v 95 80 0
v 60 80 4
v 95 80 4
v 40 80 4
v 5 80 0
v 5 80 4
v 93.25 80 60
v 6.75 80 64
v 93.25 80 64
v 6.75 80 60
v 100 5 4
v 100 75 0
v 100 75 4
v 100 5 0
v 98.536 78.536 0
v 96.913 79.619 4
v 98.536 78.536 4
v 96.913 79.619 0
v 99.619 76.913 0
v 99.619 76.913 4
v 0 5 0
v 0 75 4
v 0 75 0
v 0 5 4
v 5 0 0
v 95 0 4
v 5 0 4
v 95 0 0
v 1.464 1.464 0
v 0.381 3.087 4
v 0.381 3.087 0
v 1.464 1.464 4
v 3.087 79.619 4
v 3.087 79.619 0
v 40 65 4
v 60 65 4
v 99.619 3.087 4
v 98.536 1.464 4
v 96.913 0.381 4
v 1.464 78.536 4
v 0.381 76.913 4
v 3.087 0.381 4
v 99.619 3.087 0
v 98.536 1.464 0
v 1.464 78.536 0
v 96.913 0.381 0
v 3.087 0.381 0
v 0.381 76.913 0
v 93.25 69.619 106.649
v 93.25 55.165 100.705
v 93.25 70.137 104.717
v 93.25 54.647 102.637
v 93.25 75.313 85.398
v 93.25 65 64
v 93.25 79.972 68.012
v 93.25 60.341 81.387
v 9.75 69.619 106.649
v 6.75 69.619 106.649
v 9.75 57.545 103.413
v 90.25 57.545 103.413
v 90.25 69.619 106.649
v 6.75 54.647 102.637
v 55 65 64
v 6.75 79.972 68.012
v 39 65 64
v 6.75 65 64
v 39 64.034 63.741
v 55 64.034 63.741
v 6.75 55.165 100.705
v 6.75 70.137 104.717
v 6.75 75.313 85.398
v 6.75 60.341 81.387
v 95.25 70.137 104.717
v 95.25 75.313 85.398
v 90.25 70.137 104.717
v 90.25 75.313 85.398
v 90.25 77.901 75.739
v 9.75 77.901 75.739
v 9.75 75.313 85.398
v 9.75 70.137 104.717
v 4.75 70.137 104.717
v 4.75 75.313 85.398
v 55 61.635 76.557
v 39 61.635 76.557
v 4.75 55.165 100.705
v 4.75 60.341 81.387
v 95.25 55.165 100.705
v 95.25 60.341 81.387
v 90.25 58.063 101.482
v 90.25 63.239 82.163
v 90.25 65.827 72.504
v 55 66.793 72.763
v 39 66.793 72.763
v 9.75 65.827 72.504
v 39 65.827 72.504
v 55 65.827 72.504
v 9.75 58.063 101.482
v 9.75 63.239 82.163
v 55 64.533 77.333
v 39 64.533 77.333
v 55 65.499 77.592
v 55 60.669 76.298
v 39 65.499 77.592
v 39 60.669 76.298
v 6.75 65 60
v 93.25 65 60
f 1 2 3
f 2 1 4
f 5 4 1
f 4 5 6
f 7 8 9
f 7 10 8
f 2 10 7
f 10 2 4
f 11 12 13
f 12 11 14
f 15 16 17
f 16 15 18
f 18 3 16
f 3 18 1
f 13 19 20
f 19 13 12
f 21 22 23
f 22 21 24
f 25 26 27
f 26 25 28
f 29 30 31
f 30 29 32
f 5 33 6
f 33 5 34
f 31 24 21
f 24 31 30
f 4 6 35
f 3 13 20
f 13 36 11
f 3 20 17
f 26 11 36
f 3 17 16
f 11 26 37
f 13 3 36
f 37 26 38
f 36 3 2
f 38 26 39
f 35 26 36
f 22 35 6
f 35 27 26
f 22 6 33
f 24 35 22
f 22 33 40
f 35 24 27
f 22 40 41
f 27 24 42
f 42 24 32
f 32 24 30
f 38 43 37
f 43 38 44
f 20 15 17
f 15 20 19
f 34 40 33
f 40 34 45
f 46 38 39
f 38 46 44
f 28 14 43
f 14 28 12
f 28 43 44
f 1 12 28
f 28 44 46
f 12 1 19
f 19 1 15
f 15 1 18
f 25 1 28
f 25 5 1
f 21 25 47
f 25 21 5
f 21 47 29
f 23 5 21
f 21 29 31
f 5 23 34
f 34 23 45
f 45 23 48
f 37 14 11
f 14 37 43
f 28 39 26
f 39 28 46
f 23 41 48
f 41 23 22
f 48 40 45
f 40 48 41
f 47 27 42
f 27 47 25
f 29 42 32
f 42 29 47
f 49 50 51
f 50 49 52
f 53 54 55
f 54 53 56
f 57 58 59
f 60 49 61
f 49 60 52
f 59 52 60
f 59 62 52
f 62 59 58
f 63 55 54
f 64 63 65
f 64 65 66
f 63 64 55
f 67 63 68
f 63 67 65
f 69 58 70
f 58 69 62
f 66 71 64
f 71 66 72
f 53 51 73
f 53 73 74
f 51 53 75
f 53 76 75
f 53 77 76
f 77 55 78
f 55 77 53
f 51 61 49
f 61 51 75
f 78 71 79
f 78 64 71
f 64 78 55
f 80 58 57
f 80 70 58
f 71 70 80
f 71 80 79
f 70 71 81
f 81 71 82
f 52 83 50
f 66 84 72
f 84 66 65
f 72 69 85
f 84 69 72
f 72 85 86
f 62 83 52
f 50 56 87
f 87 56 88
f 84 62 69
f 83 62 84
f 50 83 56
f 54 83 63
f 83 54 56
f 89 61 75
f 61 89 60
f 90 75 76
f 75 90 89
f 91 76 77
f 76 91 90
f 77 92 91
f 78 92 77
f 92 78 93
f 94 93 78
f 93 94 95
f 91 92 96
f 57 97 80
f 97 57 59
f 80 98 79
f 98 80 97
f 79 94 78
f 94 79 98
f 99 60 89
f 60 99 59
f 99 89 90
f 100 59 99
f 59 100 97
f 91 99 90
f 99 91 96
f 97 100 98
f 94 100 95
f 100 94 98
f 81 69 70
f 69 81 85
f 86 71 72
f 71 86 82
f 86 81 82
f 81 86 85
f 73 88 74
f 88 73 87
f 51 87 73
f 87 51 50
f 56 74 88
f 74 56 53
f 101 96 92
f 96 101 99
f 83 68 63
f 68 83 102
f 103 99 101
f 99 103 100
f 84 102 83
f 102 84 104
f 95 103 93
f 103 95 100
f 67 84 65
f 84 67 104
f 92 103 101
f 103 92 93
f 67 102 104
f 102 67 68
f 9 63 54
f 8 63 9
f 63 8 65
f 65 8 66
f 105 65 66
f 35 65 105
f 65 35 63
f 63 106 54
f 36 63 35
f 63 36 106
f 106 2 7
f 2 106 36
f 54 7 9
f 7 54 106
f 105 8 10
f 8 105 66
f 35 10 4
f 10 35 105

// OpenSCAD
// ============================================================================
// Professional Phone Mount - Car Dashboard/Desk Mount
// Purpose: Adjustable phone holder with secure grip and tilt mechanism
// Units: millimetres (mm)
// ============================================================================

/* ----------------------------- USER PARAMETERS -------------------------------- */
phone_width = 80;         // phone width (mm) - iPhone 14: 71.5mm, Samsung S23: 70.9mm
phone_thickness = 12;     // phone thickness with case (mm)
mount_base_width = 100;   // base plate width for stability (mm)
mount_base_depth = 80;    // base plate depth (mm) 
arm_height = 60;          // height of mounting arm (mm)
tilt_angle = 15;          // viewing angle tilt (degrees)
grip_depth = 15;          // how deep the side grips go (mm)
bottom_support_height = 8; // height of bottom phone rest (mm)

/* ------------------------- Assertions & Limits ---------------------------- */
assert(phone_width >= 60 && phone_width <= 100, "Phone width should be 60-100mm");
assert(phone_thickness >= 8 && phone_thickness <= 20, "Phone thickness should be 8-20mm");
assert(tilt_angle >= 0 && tilt_angle <= 45, "Tilt angle should be 0-45 degrees");

/* ------------------------- Derived Measurements --------------------------- */
wall_thickness = 3;
tolerance = 0.5;
phone_cradle_width = phone_width + tolerance;
phone_cradle_depth = phone_thickness + tolerance;

/* ------------------------------ Modules ---------------------------------- */

module base_plate() {
    // Stable base with rounded corners
    hull() {
        translate([5, 5, 0]) cylinder(r=5, h=4);
        translate([mount_base_width-5, 5, 0]) cylinder(r=5, h=4);
        translate([5, mount_base_depth-5, 0]) cylinder(r=5, h=4);
        translate([mount_base_width-5, mount_base_depth-5, 0]) cylinder(r=5, h=4);
    }
    
    // Cable management groove
    translate([mount_base_width/2 - 3, 0, 0])
        cube([6, mount_base_depth, 2]);
}

module mounting_arm() {
    // Vertical support arm
    translate([mount_base_width/2 - wall_thickness/2, mount_base_depth - 15, 4])
        cube([wall_thickness + 6, 15, arm_height]);
}

module phone_cradle() {
    // Main cradle body
    difference() {
        // Outer shell
        cube([phone_cradle_width + 2*wall_thickness, 
              phone_cradle_depth + wall_thickness, 
              40]);
        
        // Phone cavity
        translate([wall_thickness, wall_thickness, bottom_support_height])
            cube([phone_cradle_width, phone_cradle_depth + 1, 50]);
    }
    
    // Side grips for security
    translate([-2, 0, bottom_support_height + 10]) {
        cube([wall_thickness + 2, phone_cradle_depth + wall_thickness, 20]);
    }
    translate([phone_cradle_width + wall_thickness, 0, bottom_support_height + 10]) {
        cube([wall_thickness + 2, phone_cradle_depth + wall_thickness, 20]);
    }
    
    // Charging port access
    translate([phone_cradle_width/2 - 8, -1, 0])
        cube([16, wall_thickness + 2, bottom_support_height + 5]);
}

module complete_phone_mount() {
    // Base plate
    base_plate();
    
    // Mounting arm
    mounting_arm();
    
    // Phone cradle with tilt
    translate([mount_base_width/2 - phone_cradle_width/2 - wall_thickness, 
               mount_base_depth - 15, 
               arm_height + 4]) {
        rotate([tilt_angle, 0, 0])
            phone_cradle();
    }
    
    // Support brackets
    hull() {
        translate([mount_base_width/2 - 10, mount_base_depth - 15, 4])
            cube([20, 15, 5]);
        translate([mount_base_width/2 - phone_cradle_width/2 - wall_thickness, 
                   mount_base_depth - 15, 
                   arm_height])
            cube([phone_cradle_width + 2*wall_thickness, 15, 4]);
    }
}

/* --------------------------------- Call ---------------------------------- */
complete_phone_mount();

/* ============================== HOW TO PRINT / ORIENT ============================== */
// Print orientation: Ball socket up, clamp down on build plate
// Supports: Yes, for overhangs in ball socket area
// Layer height: 0.2mm for better detail on ball joint
// Infill: 25-30% for strength in moving parts
// Print speed: Slower (40mm/s) for better surface finish
// Post-processing: Test fit ball joint, may need light sanding for smooth operation
